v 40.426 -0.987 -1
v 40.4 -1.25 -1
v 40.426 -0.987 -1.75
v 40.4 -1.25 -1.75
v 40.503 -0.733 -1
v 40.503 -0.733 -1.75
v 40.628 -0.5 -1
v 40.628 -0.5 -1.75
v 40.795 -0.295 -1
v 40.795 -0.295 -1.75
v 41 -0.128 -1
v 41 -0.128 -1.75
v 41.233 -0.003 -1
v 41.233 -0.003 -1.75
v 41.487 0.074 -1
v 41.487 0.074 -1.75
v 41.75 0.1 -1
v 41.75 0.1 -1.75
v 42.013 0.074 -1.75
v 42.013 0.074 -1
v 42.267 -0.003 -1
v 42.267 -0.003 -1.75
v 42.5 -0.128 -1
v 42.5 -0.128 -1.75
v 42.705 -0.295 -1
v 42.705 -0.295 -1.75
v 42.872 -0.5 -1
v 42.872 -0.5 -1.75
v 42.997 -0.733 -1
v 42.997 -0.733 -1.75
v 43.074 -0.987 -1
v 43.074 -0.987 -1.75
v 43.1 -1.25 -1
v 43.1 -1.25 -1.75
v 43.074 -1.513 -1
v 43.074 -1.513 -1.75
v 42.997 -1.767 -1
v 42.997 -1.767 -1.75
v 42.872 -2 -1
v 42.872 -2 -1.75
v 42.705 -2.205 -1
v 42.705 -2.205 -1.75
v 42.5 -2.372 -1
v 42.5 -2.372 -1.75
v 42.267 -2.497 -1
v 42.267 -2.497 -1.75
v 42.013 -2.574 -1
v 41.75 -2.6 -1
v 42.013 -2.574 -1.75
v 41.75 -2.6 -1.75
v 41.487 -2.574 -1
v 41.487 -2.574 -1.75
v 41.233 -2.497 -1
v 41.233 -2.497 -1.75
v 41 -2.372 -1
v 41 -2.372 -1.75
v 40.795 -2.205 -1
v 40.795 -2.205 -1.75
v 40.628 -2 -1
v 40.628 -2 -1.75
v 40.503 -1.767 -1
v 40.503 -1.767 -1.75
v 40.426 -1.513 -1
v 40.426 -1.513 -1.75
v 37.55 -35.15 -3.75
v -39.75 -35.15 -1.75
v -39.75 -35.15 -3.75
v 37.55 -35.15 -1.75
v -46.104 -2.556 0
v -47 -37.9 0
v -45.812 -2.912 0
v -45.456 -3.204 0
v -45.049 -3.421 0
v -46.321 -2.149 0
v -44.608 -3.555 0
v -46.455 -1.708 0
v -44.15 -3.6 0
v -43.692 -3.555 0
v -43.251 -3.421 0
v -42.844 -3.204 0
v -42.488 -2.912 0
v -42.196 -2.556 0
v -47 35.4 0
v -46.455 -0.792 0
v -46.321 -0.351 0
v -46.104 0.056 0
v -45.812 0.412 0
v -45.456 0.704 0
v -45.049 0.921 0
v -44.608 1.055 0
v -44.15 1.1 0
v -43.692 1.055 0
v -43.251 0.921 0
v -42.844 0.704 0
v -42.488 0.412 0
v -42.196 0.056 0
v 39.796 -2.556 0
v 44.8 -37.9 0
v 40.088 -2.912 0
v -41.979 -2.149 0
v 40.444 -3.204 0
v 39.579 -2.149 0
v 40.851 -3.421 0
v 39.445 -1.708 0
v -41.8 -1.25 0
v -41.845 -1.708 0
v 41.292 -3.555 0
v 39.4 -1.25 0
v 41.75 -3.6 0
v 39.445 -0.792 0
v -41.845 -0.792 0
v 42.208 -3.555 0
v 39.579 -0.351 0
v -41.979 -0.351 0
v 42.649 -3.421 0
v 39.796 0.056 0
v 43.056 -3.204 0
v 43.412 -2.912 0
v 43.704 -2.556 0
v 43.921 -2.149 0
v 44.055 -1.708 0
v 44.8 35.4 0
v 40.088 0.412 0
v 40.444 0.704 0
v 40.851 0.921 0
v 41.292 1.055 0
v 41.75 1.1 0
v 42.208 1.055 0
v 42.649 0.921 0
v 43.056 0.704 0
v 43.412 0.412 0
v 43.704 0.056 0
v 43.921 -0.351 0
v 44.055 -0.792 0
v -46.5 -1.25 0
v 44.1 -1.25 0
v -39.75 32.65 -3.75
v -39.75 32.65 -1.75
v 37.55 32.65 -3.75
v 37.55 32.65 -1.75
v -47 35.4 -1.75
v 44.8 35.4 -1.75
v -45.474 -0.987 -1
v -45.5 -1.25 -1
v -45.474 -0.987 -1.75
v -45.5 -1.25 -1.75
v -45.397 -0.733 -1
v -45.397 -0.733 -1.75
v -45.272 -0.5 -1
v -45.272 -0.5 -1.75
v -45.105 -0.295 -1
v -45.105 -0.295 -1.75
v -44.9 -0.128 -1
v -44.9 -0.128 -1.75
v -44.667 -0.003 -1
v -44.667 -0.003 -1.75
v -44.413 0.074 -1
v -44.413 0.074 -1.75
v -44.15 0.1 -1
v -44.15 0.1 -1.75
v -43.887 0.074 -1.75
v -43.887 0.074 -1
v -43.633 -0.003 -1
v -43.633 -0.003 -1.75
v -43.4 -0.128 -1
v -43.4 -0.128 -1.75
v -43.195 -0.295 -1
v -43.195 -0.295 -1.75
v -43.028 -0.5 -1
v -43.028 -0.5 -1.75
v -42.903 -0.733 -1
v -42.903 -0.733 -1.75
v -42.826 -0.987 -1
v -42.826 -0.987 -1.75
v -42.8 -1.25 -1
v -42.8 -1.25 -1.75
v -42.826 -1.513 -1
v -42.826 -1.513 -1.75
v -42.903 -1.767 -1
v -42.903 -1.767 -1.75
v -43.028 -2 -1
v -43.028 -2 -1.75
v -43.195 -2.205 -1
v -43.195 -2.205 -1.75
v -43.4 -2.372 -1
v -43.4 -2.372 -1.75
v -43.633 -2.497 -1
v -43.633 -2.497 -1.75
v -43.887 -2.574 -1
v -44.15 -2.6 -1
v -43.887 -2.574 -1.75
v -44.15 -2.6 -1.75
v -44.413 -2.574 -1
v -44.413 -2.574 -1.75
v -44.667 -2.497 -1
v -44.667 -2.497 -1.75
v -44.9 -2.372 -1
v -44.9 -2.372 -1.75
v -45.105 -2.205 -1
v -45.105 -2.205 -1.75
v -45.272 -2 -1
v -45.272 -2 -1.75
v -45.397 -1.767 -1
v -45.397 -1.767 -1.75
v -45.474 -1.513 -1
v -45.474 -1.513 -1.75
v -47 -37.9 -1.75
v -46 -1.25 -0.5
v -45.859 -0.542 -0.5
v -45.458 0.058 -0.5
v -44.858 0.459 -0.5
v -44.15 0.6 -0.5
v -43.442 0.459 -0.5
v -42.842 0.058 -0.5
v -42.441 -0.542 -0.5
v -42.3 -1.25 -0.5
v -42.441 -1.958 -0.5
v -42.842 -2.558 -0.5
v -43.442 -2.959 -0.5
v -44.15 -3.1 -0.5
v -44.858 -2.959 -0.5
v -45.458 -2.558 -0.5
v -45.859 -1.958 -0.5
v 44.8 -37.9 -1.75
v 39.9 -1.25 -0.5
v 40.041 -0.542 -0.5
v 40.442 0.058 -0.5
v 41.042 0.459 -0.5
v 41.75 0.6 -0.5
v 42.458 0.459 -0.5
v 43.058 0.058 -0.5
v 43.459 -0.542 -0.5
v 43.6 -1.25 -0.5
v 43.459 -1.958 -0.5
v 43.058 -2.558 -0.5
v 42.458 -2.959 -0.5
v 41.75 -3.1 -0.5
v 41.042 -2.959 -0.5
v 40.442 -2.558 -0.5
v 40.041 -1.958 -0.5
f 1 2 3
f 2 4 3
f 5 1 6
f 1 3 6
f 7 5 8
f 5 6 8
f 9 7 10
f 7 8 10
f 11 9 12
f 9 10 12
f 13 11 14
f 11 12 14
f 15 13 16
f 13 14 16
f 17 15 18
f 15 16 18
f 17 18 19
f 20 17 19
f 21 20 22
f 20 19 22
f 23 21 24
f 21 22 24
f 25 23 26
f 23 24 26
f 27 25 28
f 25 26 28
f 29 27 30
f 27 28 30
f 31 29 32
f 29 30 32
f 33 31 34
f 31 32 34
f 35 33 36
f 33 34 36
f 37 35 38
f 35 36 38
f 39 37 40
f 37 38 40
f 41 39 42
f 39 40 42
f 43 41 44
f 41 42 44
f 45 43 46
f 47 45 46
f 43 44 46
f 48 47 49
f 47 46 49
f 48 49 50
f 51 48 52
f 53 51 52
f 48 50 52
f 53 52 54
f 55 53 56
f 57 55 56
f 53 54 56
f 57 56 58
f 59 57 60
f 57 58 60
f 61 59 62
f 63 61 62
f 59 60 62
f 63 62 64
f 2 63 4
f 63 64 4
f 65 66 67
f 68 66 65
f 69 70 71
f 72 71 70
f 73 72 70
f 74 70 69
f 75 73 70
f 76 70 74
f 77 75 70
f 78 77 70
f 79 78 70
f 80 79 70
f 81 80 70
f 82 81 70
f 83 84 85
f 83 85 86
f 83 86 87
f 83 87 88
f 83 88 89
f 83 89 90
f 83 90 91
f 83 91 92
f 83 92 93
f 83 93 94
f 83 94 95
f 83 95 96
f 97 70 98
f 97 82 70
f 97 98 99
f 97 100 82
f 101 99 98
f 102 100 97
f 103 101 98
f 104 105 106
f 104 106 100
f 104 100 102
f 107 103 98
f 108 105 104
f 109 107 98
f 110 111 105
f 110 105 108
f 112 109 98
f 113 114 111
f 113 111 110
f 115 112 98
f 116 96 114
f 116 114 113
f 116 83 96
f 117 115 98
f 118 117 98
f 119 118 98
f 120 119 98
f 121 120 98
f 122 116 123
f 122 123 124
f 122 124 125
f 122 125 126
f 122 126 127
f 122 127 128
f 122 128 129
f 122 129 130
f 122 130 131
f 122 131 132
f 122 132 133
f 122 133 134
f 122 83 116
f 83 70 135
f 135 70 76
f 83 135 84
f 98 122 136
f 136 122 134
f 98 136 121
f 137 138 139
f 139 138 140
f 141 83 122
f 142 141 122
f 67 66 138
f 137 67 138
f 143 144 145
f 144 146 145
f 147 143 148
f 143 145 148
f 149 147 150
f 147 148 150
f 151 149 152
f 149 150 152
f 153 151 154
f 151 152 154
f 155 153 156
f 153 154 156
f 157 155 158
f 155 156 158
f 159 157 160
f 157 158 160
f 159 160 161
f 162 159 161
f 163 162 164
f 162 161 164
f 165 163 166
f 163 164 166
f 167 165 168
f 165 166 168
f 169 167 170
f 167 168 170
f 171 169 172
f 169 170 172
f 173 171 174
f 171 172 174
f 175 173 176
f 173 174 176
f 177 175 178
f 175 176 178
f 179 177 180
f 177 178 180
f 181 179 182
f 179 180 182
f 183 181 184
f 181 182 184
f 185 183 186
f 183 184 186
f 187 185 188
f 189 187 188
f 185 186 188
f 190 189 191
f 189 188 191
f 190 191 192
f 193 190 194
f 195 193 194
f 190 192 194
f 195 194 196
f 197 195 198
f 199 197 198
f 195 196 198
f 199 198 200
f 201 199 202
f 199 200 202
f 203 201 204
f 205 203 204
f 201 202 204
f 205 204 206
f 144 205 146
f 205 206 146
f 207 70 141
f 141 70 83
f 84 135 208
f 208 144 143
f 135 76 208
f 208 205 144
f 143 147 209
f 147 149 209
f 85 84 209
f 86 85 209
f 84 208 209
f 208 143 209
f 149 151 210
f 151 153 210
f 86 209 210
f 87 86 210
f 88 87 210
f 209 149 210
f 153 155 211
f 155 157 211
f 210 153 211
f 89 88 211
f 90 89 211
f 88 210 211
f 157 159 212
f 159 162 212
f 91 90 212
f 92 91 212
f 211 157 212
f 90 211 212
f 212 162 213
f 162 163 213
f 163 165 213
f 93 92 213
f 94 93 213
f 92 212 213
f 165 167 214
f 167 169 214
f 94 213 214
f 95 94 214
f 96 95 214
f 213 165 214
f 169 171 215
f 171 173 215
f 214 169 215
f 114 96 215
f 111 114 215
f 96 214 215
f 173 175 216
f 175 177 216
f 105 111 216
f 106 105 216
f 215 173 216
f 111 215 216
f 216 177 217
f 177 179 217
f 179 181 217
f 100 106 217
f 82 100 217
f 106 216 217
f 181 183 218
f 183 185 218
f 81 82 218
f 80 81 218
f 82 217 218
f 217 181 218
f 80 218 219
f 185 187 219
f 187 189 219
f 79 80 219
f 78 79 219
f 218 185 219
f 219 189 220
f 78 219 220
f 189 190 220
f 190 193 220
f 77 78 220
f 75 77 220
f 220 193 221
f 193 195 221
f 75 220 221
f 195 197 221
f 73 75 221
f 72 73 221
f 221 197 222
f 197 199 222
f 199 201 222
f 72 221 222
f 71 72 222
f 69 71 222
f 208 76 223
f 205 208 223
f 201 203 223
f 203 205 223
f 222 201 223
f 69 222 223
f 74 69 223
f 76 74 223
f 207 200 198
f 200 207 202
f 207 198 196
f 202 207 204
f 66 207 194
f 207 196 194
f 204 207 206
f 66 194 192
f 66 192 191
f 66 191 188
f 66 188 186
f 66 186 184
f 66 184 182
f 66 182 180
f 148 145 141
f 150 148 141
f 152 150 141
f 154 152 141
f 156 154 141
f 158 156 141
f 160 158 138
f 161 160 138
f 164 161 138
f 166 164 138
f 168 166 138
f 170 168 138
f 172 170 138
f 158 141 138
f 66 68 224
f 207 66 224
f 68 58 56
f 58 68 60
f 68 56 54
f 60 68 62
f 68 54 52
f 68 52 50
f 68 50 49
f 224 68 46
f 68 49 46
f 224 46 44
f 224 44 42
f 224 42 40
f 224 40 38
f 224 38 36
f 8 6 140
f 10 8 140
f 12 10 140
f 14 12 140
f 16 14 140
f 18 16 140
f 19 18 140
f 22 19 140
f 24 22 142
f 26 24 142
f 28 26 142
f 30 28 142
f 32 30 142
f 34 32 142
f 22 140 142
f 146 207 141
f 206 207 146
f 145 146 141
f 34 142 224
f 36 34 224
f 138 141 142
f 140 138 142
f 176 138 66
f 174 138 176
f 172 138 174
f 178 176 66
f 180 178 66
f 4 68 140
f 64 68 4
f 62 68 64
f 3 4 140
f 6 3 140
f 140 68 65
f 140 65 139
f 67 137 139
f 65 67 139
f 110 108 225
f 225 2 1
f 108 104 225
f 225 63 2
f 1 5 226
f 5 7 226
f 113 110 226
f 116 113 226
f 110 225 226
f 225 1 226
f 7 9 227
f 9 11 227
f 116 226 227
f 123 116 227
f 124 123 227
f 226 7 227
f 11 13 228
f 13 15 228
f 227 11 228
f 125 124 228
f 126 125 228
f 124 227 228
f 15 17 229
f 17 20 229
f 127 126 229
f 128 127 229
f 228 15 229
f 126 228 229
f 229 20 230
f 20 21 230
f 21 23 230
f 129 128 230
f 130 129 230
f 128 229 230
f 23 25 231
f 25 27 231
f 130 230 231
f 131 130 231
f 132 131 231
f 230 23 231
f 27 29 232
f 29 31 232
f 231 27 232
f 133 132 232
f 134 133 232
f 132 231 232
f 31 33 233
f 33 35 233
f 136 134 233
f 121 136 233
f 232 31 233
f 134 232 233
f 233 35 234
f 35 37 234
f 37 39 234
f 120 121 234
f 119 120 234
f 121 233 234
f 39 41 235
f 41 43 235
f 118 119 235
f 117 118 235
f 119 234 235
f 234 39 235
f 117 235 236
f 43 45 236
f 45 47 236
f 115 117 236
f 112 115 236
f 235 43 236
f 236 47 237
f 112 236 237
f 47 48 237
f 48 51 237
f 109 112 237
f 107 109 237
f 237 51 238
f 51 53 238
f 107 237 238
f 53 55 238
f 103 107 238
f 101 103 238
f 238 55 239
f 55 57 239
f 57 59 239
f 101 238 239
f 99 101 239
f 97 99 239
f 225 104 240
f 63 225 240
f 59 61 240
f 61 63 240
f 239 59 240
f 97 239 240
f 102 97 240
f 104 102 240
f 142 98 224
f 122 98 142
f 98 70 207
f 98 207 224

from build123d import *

# Parameters (mm, degrees)
F0_W           = 91.8
F0_H           = 73.3
F0_W_2         = 77.3
F0_H_2         = 67.8
F1_DEPTH       = 1.75
F2_DEPTH       = 3.75
F3_D           = 2.7
F3_CSINK_D     = 4.7
F3_CSINK_ANGLE = 90


with BuildPart() as f1:
    # F0 (on Top) → F1 (new body)
    with BuildSketch(Plane.XY):
        with Locations((-1.1, -1.25)):
            Rectangle(F0_W, F0_H)
        with Locations((-1.1, -1.25)):
            Rectangle(F0_W_2, F0_H_2, mode=Mode.SUBTRACT)
    extrude(amount=-F1_DEPTH)

    # F0 (on Top) → F2 (join)
    with BuildSketch(Plane.XY):
        with Locations((-1.1, -1.25)):
            Rectangle(F0_W_2, F0_H_2)
    extrude(amount=-F2_DEPTH)

    # F3 (through all)
    with Locations(Plane.XY):
        with Locations((-44.15, -1.25), (41.75, -1.25)):
            CounterSinkHole(F3_D / 2, F3_CSINK_D / 2, counter_sink_angle=F3_CSINK_ANGLE)


solid = f1.part
